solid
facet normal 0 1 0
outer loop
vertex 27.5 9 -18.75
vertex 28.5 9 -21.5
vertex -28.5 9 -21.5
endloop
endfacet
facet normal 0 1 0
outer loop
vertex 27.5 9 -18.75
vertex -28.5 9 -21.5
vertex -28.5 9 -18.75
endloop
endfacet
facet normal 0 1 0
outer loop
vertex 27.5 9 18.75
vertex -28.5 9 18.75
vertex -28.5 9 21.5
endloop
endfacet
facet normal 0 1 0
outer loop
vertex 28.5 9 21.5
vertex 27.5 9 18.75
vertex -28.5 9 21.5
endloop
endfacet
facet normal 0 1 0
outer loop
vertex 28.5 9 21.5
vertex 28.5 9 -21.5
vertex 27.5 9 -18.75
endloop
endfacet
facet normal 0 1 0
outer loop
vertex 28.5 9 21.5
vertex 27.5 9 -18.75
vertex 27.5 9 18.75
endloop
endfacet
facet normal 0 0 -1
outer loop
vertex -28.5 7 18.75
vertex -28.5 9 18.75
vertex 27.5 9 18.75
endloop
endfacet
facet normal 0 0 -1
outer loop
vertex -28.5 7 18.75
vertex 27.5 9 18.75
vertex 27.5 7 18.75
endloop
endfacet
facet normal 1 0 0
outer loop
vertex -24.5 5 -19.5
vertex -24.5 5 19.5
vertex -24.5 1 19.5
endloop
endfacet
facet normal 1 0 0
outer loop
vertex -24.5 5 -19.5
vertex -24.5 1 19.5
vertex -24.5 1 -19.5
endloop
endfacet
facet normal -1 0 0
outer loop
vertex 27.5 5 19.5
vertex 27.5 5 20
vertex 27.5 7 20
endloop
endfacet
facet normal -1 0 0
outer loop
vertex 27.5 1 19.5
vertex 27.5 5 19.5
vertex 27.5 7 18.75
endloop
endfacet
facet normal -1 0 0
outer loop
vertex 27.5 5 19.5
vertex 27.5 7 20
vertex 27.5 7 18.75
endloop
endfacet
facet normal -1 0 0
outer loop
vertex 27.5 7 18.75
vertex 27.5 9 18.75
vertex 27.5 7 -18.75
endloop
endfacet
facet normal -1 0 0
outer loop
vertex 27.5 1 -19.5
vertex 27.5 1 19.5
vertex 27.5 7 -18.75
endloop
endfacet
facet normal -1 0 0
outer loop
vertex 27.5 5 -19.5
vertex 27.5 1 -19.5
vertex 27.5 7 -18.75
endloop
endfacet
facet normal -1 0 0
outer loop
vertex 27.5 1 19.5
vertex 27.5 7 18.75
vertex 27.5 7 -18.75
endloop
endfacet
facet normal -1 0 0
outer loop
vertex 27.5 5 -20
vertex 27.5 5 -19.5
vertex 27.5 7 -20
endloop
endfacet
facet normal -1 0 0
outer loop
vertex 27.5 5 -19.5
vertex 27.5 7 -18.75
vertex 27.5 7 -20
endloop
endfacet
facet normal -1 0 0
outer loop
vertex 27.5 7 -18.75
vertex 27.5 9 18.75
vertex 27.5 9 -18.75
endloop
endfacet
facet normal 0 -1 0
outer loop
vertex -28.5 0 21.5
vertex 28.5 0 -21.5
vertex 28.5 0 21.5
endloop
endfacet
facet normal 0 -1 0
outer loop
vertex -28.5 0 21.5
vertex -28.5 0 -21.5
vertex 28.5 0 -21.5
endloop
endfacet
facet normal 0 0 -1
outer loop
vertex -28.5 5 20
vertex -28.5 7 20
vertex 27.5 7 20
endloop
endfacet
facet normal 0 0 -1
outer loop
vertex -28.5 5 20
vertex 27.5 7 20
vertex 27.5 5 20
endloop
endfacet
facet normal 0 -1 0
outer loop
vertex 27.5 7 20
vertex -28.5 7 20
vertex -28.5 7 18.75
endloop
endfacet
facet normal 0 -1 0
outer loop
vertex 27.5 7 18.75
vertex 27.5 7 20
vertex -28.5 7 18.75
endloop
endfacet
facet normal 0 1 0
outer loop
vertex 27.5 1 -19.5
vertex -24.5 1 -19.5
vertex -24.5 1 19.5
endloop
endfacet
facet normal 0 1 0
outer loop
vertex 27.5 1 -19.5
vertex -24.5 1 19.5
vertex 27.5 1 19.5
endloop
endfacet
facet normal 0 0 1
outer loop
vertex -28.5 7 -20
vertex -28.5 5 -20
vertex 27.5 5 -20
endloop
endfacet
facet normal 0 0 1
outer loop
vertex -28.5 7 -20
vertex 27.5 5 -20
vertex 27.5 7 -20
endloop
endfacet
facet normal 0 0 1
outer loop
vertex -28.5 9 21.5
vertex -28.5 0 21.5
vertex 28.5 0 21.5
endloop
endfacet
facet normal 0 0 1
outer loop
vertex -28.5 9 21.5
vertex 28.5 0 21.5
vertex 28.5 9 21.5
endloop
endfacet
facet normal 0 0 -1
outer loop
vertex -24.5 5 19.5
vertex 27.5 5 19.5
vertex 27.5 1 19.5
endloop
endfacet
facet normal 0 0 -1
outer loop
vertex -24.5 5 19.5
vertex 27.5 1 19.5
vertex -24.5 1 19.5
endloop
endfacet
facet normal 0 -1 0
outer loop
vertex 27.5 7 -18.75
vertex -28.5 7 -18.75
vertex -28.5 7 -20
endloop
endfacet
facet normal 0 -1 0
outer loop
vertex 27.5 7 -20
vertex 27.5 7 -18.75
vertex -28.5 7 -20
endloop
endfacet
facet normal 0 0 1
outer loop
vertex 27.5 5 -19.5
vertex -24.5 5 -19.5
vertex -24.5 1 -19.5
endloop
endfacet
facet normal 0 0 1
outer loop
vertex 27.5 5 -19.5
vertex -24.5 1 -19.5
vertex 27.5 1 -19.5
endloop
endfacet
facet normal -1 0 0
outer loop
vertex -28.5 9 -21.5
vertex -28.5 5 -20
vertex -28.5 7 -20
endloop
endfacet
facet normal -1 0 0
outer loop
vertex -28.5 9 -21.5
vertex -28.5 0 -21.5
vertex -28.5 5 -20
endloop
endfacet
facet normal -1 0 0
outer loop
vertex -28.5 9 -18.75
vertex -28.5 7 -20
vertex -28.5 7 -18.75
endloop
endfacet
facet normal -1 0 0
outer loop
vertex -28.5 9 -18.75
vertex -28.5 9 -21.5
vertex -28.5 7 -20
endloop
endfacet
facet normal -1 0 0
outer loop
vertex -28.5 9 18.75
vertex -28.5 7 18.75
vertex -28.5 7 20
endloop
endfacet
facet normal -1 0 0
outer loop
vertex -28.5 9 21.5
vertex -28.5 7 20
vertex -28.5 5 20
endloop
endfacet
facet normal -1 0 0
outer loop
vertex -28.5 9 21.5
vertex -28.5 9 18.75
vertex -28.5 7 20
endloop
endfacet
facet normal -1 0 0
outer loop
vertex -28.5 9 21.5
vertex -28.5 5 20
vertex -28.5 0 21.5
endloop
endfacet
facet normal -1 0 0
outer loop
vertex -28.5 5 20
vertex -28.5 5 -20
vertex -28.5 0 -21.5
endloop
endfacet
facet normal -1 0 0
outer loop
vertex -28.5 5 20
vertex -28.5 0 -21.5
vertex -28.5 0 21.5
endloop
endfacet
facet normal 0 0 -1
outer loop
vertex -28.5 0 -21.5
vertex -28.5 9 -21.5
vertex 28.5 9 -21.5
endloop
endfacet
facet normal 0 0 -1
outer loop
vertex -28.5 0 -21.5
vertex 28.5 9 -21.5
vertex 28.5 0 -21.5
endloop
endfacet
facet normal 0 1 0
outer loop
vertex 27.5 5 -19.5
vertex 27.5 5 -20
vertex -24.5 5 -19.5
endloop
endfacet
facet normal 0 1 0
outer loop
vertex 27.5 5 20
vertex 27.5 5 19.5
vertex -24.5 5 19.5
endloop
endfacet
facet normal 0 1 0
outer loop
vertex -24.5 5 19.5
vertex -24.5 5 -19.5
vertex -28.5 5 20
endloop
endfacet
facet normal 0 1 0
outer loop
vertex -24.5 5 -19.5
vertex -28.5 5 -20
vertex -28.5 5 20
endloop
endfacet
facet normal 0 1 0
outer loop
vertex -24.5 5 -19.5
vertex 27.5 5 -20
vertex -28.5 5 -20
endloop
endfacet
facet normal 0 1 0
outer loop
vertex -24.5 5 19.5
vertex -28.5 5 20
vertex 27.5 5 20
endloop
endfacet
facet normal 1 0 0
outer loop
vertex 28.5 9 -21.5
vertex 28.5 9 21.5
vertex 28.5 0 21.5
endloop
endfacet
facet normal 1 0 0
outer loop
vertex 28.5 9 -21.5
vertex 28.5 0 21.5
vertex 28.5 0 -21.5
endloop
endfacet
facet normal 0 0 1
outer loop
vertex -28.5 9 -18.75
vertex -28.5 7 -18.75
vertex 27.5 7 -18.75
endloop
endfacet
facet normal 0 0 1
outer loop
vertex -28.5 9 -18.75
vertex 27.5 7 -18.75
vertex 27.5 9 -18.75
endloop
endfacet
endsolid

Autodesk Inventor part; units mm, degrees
ref_plane "YZ Plane" through (0, 0, 0) normal (1, 0, 0) x (0, 1, 0)
ref_plane "XZ Plane" through (0, 0, 0) normal (0, 1, 0) x (-1, 0, 0)
ref_plane "XY Plane" through (0, 0, 0) normal (0, 0, 1) x (1, 0, 0)
sketch "Boceto1" plane through (0, 0, 0) normal (0, 1, 0) x (-1, 0, 0)
  line L0 (28.5, 20.5) -> (-28.5, 20.5)
  line L1 (-28.5, 20.5) -> (-28.5, -20.5)
  line L2 (-28.5, -20.5) -> (28.5, -20.5)
  line L3 (28.5, -20.5) -> (28.5, 20.5)
  line L4 (28.5, 20.5) -> (-28.5, -20.5) construction
  line L5 (-28.5, 20.5) -> (28.5, -20.5) construction
  point P0 (0, 0)
  dimension "d0" = 57
  dimension "d1" = 41
extrude "Extrusión1" add sketch "Boceto1" along normal blind 8
sketch "Boceto2" plane through (0, 8, 0) normal (0, 1, 0) x (1, 0, 0)
  line L0 (28.5, -20.5) -> (28.5, 20.5) projected
  line L1 (28.5, -20.5) -> (28.5, -17.5)
  line L2 (28.5, -17.5) -> (26.5, -17.5)
  line L3 (26.5, -17.5) -> (26.5, 17.5)
  line L4 (28.5, 20.5) -> (-28.5, 20.5) projected
  line L5 (26.5, 17.5) -> (-24.5, 17.5)
  line L6 (-24.5, 17.5) -> (-24.5, -17.5)
  line L7 (-24.5, -17.5) -> (26.5, -17.5)
  point P0 (0, 0)
  dimension "d4" = 3
  dimension "d5" = 2
  dimension "d6" = 35
  dimension "d7" = 51
extrude "Extrusión2" cut sketch "Boceto2" against normal blind 6
sketch "Boceto3" plane through (0, 8, 0) normal (0, 1, 0) x (1, 0, 0)
  line L0 (-24.5, -17.5) -> (-24.5, 17.5) projected
  line L1 (-24.5, -17.5) -> (-28.5, -17.5)
  line L2 (-28.5, 20.5) -> (-28.5, -20.5) projected
  line L3 (-28.5, -17.5) -> (-28.5, 17.5)
  line L4 (-24.5, 17.5) -> (26.5, 17.5) projected
  line L5 (-28.5, 17.5) -> (-24.5, 17.5)
  line L6 (-24.5, 17.5) -> (-24.5, -17.5)
  point P0 (0, 0)
  dimension "d10" = 35
extrude "Extrusión3" cut sketch "Boceto3" against normal blind 6
sketch "Boceto4" plane through (-28.5, 0, -20.5) normal (-1, 0, 0) x (0, 0, 1)
  line L0 (3, 8) -> (38, 8) projected
  line L1 (3, 8) -> (3, 7)
  line L2 (3, 7) -> (2, 7)
  line L3 (2, 7) -> (2, 6)
  line L4 (2, 6) -> (3, 6)
  line L5 (3, 8) -> (3, 2) projected
  line L6 (3, 6) -> (3, 7)
  point P0 (20.5, 0)
  dimension "d13" = 1
  dimension "d14" = 1
  dimension "d15" = 1
extrude "Extrusión4" cut sketch "Boceto4" against normal blind 55
sketch "Boceto5" plane through (-28.5, 0, -20.5) normal (-1, 0, 0) x (0, 0, 1)
  line L0 (3, 8) -> (38, 8) projected
  line L1 (38, 8) -> (38, 7)
  line L2 (38, 8) -> (38, 2) projected
  line L3 (38, 7) -> (39, 7)
  line L4 (39, 7) -> (39, 6)
  line L5 (39, 6) -> (38, 6)
  line L6 (38, 7) -> (38, 6)
  point P0 (20.5, 0)
  dimension "d18" = 1
  dimension "d19" = 1
  dimension "d20" = 1
extrude "Extrusión5" cut sketch "Boceto5" against normal blind 55
sketch "Boceto6" plane through (-28.5, 0, -20.5) normal (-1, 0, 0) x (0, 0, 1)
  line L0 (3, 8) -> (3, 7) projected
  line L1 (3, 8) -> (3, 6)
  line L2 (3, 6) -> (1, 6)
  line L3 (1, 6) -> (1, 7)
  line L4 (2, 6) -> (2, 7) projected
  line L5 (1, 7) -> (2, 7)
  line L6 (2, 7) -> (2, 8)
  line L7 (0, 8) -> (3, 8) projected
  line L8 (3, 8) -> (2, 8)
  point P0 (20.5, 0)
  dimension "d23" = 2
  dimension "d24" = 2
  dimension "d25" = 1
extrude "Extrusión6" cut sketch "Boceto6" against normal blind 55
sketch "Boceto7" plane through (-28.5, 0, -20.5) normal (-1, 0, 0) x (0, 0, 1)
  line L0 (2, 8) -> (38, 8) projected
  line L1 (39, 6) -> (38, 6) projected
  line L2 (38, 8) -> (38, 6)
  line L3 (38, 6) -> (40, 6)
  line L4 (40, 6) -> (40, 7)
  line L5 (38, 7) -> (39, 7) projected
  line L6 (40, 7) -> (39, 7)
  line L7 (39, 7) -> (39, 8)
  line L8 (38, 8) -> (41, 8) projected
  line L9 (38, 8) -> (39, 8)
  point P0 (20.5, 0)
  dimension "d28" = 2
  dimension "d29" = 1
extrude "Extrusión7" cut sketch "Boceto7" against normal blind 55
sketch "Boceto8" plane through (26.5, 2, -17.5) normal (-1, 0, 0) x (0, 0, 1)
  line L0 (-1, 6) -> (36, 6) projected
  line L1 (-1, 5) -> (-1, 6) projected
  line L2 (-1, 6) -> (-1, 5)
  line L3 (-2, 4) -> (-2, 5) projected
  line L4 (-1, 5) -> (-2, 5)
  line L5 (-2, 5) -> (-2, 4)
  line L6 (0, 4) -> (-2, 4) projected
  line L7 (-2, 4) -> (0, 4)
  line L8 (0, 0) -> (0, 4) projected
  line L9 (0, 4) -> (0, 0)
  line L10 (35, 4) -> (35, 0) projected
  line L11 (0, 0) -> (35, 0)
  line L12 (35, 0) -> (35, 4)
  line L13 (37, 4) -> (35, 4) projected
  line L14 (35, 4) -> (37, 4)
  line L15 (37, 5) -> (37, 4) projected
  line L16 (37, 4) -> (37, 5)
  line L17 (36, 5) -> (37, 5) projected
  line L18 (37, 5) -> (36, 5)
  line L19 (36, 6) -> (36, 5) projected
  line L20 (36, 5) -> (36, 6)
  line L21 (36, 6) -> (-1, 6)
  point P0 (17.5, -2)
extrude "Extrusión8" cut sketch "Boceto8" against normal blind 1
sketch "Boceto9" plane through (-28.5, 0, -20.5) normal (-1, 0, 0) x (0, 0, 1)
  line L0 (3, 2) -> (3, 6) projected
  line L1 (3, 6) -> (3, 2)
  line L2 (38, 2) -> (3, 2) projected
  line L3 (3, 2) -> (38, 2)
  line L4 (38, 6) -> (38, 2) projected
  line L5 (38, 2) -> (38, 6)
  line L6 (38, 6) -> (3, 6)
  point P0 (20.5, 0)
extrude "Extrusión9" add sketch "Boceto9" against normal blind 4
sketch "Boceto10" plane through (-28.5, 0, -20.5) normal (-1, 0, 0) x (0, 0, 1)
  line L0 (0, 0) -> (41, 0) projected
  line L1 (0, 0) -> (42, 0)
  line L2 (42, 0) -> (42, 8)
  line L3 (42, 8) -> (42, 9)
  line L4 (42, 9) -> (40, 9)
  line L5 (40, 9) -> (40, 7)
  line L6 (40, 7) -> (41, 7)
  line L7 (41, 0) -> (41, 8) projected
  line L8 (41, 7) -> (41, 5)
  line L9 (41, 5) -> (0, 5)
  line L10 (0, 0) -> (0, 8) projected
  line L11 (0, 5) -> (0, 7)
  line L12 (1, 7) -> (2, 7) projected
  line L13 (0, 7) -> (1, 7)
  line L14 (1, 7) -> (1, 9)
  line L15 (1, 9) -> (-1, 9)
  line L16 (-1, 9) -> (-1, 0)
  line L17 (-1, 0) -> (0, 0)
  point P0 (20.5, 0)
  dimension "d36" = 42
  dimension "d37" = 8
  dimension "d38" = 1
  dimension "d39" = 2
  dimension "d40" = 2
  dimension "d41" = 2
extrude "Extrusión10" add sketch "Boceto10" against normal blind 57
sketch "Boceto11" plane through (-28.5, 6, -19.5) normal (-1, 0, 0) x (0, 0, 1)
  line L0 (39, 2) -> (0, 2) projected
  line L1 (39, 2) -> (39, 1)
  line L2 (38, 1) -> (39, 1) projected
  line L3 (39, 1) -> (38, 1)
  line L4 (38, 2) -> (38, 1) projected
  line L5 (38, 1) -> (38, 2)
  line L6 (38, 2) -> (39, 2)
  line L7 (0, 1) -> (1, 1) projected
  line L8 (0, 1) -> (0, 2)
  line L9 (1, 1) -> (1, 2) projected
  line L10 (0, 2) -> (1, 2)
  line L11 (1, 2) -> (1, 1)
  line L12 (0, 0) -> (0, 1) projected
  line L13 (1, 1) -> (0, 1)
  line L14 (0, 1) -> (-1, 1)
  line L15 (-1, 1) -> (-1, -1)
  line L16 (-1, -1) -> (40, -1)
  line L17 (41, 3) -> (41, -6) projected
  line L18 (40, -1) -> (40, 1)
  line L19 (40, 1) -> (39, 1)
  line L20 (0, 1) -> (1, 1) projected
  line L21 (0, 0) -> (0, 1) projected
  line L22 (0, 1) -> (0, 0)
  line L23 (0, 0) -> (39, 0)
  line L24 (39, 0) -> (39, 1)
  line L25 (39, 1) -> (39, 0) projected
  line L26 (39, 1) -> (39, 0)
  point P0 (19.5, -6)
  dimension "d44" = 1
  dimension "d45" = 2
  dimension "d46" = 41
extrude "Extrusión11" cut sketch "Boceto11" against normal blind 56 contours L1 L2 L4 L0 | L19 L18 L16 L15 L14 L12 L23 L24 | L9 L7 L8 L0
sketch "Boceto12" plane through (28.5, 0, 21.5) normal (1, 0, 0) x (0, 0, -1)
  line L0 (2, 8) -> (2, 9) projected
  line L1 (41, 9) -> (41, 8) projected
  line L2 (2, 8) -> (41, 8)
  line L3 (41, 8) -> (41, 9)
  line L4 (41, 9) -> (2, 9)
  line L5 (2, 9) -> (2, 8)
  point P0 (21.5, 0)
extrude "Extrusión12" add sketch "Boceto12" against normal blind 1
sketch "Boceto13" plane through (-28.5, 5, 20.5) normal (0, 1, 0) x (1, 0, 0)
  line L0 (56, 1) -> (56, 0) projected
  line L1 (0, 40) -> (56, 40) projected
  line L2 (56, 1) -> (4, 1)
  line L3 (4, 1) -> (4, 40)
  line L4 (4, 40) -> (56, 40)
  line L5 (56, 40) -> (56, 1)
  point P0 (28.5, 20.5)
  dimension "d51" = 52
extrude "Extrusión13" cut sketch "Boceto13" against normal blind 4
sketch "Boceto14" plane through (-28.5, 0, -21.5) normal (-1, 0, 0) x (0, 0, 1)
  line L0 (41, 9) -> (2, 9) projected
  line L1 (41, 9) -> (40.25, 9)
  line L2 (40.25, 9) -> (40.25, 7)
  line L3 (40.25, 7) -> (41.5, 7)
  line L4 (41, 7) -> (42, 7) projected
  line L5 (41.5, 7) -> (41.5, 5)
  line L6 (41, 5) -> (42, 5) projected
  line L7 (41.5, 5) -> (1.5, 5)
  line L8 (41, 5) -> (2, 5) projected
  line L9 (1.5, 5) -> (1.5, 7)
  line L10 (1, 7) -> (2, 7) projected
  line L11 (1.5, 7) -> (2.75, 7)
  line L12 (2.75, 7) -> (2.75, 9)
  line L13 (0, 9) -> (43, 9) projected
  line L14 (2.75, 9) -> (0, 9)
  line L15 (0, 0) -> (0, 9) projected
  line L16 (0, 9) -> (0, 0)
  line L17 (43, 9) -> (43, 0) projected
  line L18 (0, 0) -> (43, 0)
  line L19 (43, 0) -> (43, 9)
  line L20 (43, 9) -> (40.25, 9)
  point P0 (21.5, 0)
  point P1 (2, 7)
  dimension "d54" = 0.75
  dimension "d55" = 2
  dimension "d56" = 40
  dimension "d57" = 1.25
extrude "Extrusión14" add sketch "Boceto14" against normal blind 4 contours L13 L17 L18 L15 L0 L12 L11 L10 L9 L7 L6 L5 L3 L2
sketch "Boceto15" plane through (-24.5, 0, -21.5) normal (1, 0, 0) x (0, 0, -1)
  line L0 (-2.75, 9) -> (-2.75, 7) projected
  line L1 (-2.75, 9) -> (-2, 9)
  line L2 (-2, 9) -> (-2, 7)
  line L3 (-2.75, 7) -> (-2, 7) projected
  line L4 (-2, 7) -> (-2.75, 7)
  line L5 (-2.75, 7) -> (-2.75, 9)
  line L6 (-1, 5) -> (-1.5, 5) projected
  line L7 (-1.5, 5) -> (-1, 5)
  line L8 (-1, 7) -> (-1, 5) projected
  line L9 (-1, 5) -> (-1, 7)
  line L10 (-1, 7) -> (-1.5, 7)
  line L11 (-1.5, 7) -> (-1.5, 5) projected
  line L12 (-1.5, 7) -> (-1.5, 5)
  line L13 (-41, 7) -> (-41, 9) projected
  line L14 (-40.25, 9) -> (-41, 9) projected
  line L15 (-41, 9) -> (-40.25, 9)
  line L16 (-40.25, 7) -> (-40.25, 9) projected
  line L17 (-40.25, 9) -> (-40.25, 7)
  line L18 (-41, 7) -> (-40.25, 7) projected
  line L19 (-40.25, 7) -> (-41, 7)
  line L20 (-41, 7) -> (-41, 9)
  line L21 (-41.5, 5) -> (-42, 5) projected
  line L22 (-41.5483, 5) -> (-42, 5)
  line L23 (-42, 5) -> (-42, 7) projected
  line L24 (-42, 5) -> (-42, 7)
  line L25 (-42, 7) -> (-41.5, 7) projected
  line L26 (-42, 7) -> (-41.5, 7)
  line L27 (-41.5, 5) -> (-41.5, 7) projected
  line L28 (-41.5, 7) -> (-41.5, 5)
  point P0 (-21.5, 0)
extrude "Extrusión15" add sketch "Boceto15" along normal blind 53
properties part number "TapaCajaArduinoNano"
